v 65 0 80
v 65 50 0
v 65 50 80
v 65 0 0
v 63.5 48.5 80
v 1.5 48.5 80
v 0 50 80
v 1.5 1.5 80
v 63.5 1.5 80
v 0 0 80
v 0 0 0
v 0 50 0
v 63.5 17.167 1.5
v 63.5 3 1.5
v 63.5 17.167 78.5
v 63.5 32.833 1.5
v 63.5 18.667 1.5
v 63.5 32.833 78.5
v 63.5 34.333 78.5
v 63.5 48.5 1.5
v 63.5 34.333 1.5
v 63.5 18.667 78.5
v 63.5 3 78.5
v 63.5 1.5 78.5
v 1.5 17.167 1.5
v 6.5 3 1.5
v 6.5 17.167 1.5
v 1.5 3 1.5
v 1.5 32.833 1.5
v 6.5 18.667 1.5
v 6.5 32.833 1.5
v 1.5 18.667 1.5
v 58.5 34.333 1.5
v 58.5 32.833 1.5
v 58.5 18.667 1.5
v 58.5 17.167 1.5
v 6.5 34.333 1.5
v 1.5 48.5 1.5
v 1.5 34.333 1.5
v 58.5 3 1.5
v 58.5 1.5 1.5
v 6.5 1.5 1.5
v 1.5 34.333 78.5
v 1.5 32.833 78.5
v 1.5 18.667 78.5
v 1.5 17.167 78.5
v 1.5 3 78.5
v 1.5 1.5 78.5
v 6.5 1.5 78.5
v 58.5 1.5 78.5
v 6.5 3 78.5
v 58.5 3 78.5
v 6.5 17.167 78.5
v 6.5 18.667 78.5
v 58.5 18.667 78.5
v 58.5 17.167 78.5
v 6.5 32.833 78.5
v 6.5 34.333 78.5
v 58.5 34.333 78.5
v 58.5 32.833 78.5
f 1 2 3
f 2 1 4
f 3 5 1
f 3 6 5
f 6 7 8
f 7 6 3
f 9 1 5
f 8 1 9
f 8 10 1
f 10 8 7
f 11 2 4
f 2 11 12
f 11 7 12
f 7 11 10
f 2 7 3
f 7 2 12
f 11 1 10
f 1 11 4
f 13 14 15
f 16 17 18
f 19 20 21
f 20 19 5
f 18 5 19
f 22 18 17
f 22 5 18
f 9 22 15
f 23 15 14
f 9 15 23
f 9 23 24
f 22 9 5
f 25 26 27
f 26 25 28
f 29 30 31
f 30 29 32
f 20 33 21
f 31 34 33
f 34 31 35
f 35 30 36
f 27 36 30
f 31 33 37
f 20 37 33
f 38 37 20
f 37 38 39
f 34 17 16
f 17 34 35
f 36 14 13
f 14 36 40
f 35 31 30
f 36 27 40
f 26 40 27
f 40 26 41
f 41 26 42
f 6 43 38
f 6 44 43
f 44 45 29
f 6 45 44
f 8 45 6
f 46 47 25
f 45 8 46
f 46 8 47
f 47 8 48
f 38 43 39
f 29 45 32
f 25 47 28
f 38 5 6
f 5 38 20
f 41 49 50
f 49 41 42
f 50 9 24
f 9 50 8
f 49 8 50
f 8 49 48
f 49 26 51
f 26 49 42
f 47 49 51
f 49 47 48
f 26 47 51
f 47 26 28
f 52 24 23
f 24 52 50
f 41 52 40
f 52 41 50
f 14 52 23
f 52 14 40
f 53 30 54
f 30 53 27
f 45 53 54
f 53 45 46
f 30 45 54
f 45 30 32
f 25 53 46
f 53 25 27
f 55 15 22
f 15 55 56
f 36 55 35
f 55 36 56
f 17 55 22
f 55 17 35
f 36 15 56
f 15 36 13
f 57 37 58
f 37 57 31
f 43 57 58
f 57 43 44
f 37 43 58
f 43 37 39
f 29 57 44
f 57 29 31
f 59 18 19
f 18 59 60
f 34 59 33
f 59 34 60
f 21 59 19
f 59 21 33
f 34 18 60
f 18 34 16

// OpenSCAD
wb_width=65;
wb_depth=50;
wb_height=80;
wb_thickness=1.5;

slider_height=(wb_depth-wb_thickness-wb_thickness)/3-0.5;


difference() {
    cube([wb_width,wb_depth,wb_height]);


    translate([wb_thickness, wb_thickness, wb_thickness])
    cube([wb_width-wb_thickness*2,wb_depth-wb_thickness*2, wb_height]);

}

color("yellow")
translate([wb_thickness, wb_thickness, wb_thickness])
cube([5, wb_thickness, wb_height-wb_thickness-wb_thickness]);

color("yellow")
translate([wb_width-wb_thickness-5, wb_thickness, wb_thickness])
cube([5, wb_thickness, wb_height-wb_thickness-wb_thickness]);

color("cyan")
translate([wb_thickness, wb_thickness + slider_height + 0.5, wb_thickness])
cube([5, wb_thickness, wb_height-wb_thickness-wb_thickness]);

color("cyan")
translate([wb_width-wb_thickness-5, wb_thickness + slider_height + 0.5, wb_thickness])
cube([5, wb_thickness, wb_height-wb_thickness-wb_thickness]);


color("grey")
translate([wb_thickness,  wb_thickness + slider_height * 2 + 0.5 * 2, wb_thickness])
cube([5, wb_thickness, wb_height-wb_thickness-wb_thickness]);

color("grey")
translate([wb_width-wb_thickness-5, wb_thickness + slider_height * 2 + 0.5 * 2, wb_thickness])
cube([5, wb_thickness, wb_height-wb_thickness-wb_thickness]);


// color("green")
// translate([0, wb_thickness, 0])
// cube([10, slider_height, 70]);

// color("lightgreen")
// translate([0, wb_thickness + slider_height + 0.5, 0])
// cube([10, slider_height, 70]);

// color("green")
// translate([0, wb_thickness + slider_height * 2 + 0.5 * 2, 0])
// cube([10, slider_height, 70]);
